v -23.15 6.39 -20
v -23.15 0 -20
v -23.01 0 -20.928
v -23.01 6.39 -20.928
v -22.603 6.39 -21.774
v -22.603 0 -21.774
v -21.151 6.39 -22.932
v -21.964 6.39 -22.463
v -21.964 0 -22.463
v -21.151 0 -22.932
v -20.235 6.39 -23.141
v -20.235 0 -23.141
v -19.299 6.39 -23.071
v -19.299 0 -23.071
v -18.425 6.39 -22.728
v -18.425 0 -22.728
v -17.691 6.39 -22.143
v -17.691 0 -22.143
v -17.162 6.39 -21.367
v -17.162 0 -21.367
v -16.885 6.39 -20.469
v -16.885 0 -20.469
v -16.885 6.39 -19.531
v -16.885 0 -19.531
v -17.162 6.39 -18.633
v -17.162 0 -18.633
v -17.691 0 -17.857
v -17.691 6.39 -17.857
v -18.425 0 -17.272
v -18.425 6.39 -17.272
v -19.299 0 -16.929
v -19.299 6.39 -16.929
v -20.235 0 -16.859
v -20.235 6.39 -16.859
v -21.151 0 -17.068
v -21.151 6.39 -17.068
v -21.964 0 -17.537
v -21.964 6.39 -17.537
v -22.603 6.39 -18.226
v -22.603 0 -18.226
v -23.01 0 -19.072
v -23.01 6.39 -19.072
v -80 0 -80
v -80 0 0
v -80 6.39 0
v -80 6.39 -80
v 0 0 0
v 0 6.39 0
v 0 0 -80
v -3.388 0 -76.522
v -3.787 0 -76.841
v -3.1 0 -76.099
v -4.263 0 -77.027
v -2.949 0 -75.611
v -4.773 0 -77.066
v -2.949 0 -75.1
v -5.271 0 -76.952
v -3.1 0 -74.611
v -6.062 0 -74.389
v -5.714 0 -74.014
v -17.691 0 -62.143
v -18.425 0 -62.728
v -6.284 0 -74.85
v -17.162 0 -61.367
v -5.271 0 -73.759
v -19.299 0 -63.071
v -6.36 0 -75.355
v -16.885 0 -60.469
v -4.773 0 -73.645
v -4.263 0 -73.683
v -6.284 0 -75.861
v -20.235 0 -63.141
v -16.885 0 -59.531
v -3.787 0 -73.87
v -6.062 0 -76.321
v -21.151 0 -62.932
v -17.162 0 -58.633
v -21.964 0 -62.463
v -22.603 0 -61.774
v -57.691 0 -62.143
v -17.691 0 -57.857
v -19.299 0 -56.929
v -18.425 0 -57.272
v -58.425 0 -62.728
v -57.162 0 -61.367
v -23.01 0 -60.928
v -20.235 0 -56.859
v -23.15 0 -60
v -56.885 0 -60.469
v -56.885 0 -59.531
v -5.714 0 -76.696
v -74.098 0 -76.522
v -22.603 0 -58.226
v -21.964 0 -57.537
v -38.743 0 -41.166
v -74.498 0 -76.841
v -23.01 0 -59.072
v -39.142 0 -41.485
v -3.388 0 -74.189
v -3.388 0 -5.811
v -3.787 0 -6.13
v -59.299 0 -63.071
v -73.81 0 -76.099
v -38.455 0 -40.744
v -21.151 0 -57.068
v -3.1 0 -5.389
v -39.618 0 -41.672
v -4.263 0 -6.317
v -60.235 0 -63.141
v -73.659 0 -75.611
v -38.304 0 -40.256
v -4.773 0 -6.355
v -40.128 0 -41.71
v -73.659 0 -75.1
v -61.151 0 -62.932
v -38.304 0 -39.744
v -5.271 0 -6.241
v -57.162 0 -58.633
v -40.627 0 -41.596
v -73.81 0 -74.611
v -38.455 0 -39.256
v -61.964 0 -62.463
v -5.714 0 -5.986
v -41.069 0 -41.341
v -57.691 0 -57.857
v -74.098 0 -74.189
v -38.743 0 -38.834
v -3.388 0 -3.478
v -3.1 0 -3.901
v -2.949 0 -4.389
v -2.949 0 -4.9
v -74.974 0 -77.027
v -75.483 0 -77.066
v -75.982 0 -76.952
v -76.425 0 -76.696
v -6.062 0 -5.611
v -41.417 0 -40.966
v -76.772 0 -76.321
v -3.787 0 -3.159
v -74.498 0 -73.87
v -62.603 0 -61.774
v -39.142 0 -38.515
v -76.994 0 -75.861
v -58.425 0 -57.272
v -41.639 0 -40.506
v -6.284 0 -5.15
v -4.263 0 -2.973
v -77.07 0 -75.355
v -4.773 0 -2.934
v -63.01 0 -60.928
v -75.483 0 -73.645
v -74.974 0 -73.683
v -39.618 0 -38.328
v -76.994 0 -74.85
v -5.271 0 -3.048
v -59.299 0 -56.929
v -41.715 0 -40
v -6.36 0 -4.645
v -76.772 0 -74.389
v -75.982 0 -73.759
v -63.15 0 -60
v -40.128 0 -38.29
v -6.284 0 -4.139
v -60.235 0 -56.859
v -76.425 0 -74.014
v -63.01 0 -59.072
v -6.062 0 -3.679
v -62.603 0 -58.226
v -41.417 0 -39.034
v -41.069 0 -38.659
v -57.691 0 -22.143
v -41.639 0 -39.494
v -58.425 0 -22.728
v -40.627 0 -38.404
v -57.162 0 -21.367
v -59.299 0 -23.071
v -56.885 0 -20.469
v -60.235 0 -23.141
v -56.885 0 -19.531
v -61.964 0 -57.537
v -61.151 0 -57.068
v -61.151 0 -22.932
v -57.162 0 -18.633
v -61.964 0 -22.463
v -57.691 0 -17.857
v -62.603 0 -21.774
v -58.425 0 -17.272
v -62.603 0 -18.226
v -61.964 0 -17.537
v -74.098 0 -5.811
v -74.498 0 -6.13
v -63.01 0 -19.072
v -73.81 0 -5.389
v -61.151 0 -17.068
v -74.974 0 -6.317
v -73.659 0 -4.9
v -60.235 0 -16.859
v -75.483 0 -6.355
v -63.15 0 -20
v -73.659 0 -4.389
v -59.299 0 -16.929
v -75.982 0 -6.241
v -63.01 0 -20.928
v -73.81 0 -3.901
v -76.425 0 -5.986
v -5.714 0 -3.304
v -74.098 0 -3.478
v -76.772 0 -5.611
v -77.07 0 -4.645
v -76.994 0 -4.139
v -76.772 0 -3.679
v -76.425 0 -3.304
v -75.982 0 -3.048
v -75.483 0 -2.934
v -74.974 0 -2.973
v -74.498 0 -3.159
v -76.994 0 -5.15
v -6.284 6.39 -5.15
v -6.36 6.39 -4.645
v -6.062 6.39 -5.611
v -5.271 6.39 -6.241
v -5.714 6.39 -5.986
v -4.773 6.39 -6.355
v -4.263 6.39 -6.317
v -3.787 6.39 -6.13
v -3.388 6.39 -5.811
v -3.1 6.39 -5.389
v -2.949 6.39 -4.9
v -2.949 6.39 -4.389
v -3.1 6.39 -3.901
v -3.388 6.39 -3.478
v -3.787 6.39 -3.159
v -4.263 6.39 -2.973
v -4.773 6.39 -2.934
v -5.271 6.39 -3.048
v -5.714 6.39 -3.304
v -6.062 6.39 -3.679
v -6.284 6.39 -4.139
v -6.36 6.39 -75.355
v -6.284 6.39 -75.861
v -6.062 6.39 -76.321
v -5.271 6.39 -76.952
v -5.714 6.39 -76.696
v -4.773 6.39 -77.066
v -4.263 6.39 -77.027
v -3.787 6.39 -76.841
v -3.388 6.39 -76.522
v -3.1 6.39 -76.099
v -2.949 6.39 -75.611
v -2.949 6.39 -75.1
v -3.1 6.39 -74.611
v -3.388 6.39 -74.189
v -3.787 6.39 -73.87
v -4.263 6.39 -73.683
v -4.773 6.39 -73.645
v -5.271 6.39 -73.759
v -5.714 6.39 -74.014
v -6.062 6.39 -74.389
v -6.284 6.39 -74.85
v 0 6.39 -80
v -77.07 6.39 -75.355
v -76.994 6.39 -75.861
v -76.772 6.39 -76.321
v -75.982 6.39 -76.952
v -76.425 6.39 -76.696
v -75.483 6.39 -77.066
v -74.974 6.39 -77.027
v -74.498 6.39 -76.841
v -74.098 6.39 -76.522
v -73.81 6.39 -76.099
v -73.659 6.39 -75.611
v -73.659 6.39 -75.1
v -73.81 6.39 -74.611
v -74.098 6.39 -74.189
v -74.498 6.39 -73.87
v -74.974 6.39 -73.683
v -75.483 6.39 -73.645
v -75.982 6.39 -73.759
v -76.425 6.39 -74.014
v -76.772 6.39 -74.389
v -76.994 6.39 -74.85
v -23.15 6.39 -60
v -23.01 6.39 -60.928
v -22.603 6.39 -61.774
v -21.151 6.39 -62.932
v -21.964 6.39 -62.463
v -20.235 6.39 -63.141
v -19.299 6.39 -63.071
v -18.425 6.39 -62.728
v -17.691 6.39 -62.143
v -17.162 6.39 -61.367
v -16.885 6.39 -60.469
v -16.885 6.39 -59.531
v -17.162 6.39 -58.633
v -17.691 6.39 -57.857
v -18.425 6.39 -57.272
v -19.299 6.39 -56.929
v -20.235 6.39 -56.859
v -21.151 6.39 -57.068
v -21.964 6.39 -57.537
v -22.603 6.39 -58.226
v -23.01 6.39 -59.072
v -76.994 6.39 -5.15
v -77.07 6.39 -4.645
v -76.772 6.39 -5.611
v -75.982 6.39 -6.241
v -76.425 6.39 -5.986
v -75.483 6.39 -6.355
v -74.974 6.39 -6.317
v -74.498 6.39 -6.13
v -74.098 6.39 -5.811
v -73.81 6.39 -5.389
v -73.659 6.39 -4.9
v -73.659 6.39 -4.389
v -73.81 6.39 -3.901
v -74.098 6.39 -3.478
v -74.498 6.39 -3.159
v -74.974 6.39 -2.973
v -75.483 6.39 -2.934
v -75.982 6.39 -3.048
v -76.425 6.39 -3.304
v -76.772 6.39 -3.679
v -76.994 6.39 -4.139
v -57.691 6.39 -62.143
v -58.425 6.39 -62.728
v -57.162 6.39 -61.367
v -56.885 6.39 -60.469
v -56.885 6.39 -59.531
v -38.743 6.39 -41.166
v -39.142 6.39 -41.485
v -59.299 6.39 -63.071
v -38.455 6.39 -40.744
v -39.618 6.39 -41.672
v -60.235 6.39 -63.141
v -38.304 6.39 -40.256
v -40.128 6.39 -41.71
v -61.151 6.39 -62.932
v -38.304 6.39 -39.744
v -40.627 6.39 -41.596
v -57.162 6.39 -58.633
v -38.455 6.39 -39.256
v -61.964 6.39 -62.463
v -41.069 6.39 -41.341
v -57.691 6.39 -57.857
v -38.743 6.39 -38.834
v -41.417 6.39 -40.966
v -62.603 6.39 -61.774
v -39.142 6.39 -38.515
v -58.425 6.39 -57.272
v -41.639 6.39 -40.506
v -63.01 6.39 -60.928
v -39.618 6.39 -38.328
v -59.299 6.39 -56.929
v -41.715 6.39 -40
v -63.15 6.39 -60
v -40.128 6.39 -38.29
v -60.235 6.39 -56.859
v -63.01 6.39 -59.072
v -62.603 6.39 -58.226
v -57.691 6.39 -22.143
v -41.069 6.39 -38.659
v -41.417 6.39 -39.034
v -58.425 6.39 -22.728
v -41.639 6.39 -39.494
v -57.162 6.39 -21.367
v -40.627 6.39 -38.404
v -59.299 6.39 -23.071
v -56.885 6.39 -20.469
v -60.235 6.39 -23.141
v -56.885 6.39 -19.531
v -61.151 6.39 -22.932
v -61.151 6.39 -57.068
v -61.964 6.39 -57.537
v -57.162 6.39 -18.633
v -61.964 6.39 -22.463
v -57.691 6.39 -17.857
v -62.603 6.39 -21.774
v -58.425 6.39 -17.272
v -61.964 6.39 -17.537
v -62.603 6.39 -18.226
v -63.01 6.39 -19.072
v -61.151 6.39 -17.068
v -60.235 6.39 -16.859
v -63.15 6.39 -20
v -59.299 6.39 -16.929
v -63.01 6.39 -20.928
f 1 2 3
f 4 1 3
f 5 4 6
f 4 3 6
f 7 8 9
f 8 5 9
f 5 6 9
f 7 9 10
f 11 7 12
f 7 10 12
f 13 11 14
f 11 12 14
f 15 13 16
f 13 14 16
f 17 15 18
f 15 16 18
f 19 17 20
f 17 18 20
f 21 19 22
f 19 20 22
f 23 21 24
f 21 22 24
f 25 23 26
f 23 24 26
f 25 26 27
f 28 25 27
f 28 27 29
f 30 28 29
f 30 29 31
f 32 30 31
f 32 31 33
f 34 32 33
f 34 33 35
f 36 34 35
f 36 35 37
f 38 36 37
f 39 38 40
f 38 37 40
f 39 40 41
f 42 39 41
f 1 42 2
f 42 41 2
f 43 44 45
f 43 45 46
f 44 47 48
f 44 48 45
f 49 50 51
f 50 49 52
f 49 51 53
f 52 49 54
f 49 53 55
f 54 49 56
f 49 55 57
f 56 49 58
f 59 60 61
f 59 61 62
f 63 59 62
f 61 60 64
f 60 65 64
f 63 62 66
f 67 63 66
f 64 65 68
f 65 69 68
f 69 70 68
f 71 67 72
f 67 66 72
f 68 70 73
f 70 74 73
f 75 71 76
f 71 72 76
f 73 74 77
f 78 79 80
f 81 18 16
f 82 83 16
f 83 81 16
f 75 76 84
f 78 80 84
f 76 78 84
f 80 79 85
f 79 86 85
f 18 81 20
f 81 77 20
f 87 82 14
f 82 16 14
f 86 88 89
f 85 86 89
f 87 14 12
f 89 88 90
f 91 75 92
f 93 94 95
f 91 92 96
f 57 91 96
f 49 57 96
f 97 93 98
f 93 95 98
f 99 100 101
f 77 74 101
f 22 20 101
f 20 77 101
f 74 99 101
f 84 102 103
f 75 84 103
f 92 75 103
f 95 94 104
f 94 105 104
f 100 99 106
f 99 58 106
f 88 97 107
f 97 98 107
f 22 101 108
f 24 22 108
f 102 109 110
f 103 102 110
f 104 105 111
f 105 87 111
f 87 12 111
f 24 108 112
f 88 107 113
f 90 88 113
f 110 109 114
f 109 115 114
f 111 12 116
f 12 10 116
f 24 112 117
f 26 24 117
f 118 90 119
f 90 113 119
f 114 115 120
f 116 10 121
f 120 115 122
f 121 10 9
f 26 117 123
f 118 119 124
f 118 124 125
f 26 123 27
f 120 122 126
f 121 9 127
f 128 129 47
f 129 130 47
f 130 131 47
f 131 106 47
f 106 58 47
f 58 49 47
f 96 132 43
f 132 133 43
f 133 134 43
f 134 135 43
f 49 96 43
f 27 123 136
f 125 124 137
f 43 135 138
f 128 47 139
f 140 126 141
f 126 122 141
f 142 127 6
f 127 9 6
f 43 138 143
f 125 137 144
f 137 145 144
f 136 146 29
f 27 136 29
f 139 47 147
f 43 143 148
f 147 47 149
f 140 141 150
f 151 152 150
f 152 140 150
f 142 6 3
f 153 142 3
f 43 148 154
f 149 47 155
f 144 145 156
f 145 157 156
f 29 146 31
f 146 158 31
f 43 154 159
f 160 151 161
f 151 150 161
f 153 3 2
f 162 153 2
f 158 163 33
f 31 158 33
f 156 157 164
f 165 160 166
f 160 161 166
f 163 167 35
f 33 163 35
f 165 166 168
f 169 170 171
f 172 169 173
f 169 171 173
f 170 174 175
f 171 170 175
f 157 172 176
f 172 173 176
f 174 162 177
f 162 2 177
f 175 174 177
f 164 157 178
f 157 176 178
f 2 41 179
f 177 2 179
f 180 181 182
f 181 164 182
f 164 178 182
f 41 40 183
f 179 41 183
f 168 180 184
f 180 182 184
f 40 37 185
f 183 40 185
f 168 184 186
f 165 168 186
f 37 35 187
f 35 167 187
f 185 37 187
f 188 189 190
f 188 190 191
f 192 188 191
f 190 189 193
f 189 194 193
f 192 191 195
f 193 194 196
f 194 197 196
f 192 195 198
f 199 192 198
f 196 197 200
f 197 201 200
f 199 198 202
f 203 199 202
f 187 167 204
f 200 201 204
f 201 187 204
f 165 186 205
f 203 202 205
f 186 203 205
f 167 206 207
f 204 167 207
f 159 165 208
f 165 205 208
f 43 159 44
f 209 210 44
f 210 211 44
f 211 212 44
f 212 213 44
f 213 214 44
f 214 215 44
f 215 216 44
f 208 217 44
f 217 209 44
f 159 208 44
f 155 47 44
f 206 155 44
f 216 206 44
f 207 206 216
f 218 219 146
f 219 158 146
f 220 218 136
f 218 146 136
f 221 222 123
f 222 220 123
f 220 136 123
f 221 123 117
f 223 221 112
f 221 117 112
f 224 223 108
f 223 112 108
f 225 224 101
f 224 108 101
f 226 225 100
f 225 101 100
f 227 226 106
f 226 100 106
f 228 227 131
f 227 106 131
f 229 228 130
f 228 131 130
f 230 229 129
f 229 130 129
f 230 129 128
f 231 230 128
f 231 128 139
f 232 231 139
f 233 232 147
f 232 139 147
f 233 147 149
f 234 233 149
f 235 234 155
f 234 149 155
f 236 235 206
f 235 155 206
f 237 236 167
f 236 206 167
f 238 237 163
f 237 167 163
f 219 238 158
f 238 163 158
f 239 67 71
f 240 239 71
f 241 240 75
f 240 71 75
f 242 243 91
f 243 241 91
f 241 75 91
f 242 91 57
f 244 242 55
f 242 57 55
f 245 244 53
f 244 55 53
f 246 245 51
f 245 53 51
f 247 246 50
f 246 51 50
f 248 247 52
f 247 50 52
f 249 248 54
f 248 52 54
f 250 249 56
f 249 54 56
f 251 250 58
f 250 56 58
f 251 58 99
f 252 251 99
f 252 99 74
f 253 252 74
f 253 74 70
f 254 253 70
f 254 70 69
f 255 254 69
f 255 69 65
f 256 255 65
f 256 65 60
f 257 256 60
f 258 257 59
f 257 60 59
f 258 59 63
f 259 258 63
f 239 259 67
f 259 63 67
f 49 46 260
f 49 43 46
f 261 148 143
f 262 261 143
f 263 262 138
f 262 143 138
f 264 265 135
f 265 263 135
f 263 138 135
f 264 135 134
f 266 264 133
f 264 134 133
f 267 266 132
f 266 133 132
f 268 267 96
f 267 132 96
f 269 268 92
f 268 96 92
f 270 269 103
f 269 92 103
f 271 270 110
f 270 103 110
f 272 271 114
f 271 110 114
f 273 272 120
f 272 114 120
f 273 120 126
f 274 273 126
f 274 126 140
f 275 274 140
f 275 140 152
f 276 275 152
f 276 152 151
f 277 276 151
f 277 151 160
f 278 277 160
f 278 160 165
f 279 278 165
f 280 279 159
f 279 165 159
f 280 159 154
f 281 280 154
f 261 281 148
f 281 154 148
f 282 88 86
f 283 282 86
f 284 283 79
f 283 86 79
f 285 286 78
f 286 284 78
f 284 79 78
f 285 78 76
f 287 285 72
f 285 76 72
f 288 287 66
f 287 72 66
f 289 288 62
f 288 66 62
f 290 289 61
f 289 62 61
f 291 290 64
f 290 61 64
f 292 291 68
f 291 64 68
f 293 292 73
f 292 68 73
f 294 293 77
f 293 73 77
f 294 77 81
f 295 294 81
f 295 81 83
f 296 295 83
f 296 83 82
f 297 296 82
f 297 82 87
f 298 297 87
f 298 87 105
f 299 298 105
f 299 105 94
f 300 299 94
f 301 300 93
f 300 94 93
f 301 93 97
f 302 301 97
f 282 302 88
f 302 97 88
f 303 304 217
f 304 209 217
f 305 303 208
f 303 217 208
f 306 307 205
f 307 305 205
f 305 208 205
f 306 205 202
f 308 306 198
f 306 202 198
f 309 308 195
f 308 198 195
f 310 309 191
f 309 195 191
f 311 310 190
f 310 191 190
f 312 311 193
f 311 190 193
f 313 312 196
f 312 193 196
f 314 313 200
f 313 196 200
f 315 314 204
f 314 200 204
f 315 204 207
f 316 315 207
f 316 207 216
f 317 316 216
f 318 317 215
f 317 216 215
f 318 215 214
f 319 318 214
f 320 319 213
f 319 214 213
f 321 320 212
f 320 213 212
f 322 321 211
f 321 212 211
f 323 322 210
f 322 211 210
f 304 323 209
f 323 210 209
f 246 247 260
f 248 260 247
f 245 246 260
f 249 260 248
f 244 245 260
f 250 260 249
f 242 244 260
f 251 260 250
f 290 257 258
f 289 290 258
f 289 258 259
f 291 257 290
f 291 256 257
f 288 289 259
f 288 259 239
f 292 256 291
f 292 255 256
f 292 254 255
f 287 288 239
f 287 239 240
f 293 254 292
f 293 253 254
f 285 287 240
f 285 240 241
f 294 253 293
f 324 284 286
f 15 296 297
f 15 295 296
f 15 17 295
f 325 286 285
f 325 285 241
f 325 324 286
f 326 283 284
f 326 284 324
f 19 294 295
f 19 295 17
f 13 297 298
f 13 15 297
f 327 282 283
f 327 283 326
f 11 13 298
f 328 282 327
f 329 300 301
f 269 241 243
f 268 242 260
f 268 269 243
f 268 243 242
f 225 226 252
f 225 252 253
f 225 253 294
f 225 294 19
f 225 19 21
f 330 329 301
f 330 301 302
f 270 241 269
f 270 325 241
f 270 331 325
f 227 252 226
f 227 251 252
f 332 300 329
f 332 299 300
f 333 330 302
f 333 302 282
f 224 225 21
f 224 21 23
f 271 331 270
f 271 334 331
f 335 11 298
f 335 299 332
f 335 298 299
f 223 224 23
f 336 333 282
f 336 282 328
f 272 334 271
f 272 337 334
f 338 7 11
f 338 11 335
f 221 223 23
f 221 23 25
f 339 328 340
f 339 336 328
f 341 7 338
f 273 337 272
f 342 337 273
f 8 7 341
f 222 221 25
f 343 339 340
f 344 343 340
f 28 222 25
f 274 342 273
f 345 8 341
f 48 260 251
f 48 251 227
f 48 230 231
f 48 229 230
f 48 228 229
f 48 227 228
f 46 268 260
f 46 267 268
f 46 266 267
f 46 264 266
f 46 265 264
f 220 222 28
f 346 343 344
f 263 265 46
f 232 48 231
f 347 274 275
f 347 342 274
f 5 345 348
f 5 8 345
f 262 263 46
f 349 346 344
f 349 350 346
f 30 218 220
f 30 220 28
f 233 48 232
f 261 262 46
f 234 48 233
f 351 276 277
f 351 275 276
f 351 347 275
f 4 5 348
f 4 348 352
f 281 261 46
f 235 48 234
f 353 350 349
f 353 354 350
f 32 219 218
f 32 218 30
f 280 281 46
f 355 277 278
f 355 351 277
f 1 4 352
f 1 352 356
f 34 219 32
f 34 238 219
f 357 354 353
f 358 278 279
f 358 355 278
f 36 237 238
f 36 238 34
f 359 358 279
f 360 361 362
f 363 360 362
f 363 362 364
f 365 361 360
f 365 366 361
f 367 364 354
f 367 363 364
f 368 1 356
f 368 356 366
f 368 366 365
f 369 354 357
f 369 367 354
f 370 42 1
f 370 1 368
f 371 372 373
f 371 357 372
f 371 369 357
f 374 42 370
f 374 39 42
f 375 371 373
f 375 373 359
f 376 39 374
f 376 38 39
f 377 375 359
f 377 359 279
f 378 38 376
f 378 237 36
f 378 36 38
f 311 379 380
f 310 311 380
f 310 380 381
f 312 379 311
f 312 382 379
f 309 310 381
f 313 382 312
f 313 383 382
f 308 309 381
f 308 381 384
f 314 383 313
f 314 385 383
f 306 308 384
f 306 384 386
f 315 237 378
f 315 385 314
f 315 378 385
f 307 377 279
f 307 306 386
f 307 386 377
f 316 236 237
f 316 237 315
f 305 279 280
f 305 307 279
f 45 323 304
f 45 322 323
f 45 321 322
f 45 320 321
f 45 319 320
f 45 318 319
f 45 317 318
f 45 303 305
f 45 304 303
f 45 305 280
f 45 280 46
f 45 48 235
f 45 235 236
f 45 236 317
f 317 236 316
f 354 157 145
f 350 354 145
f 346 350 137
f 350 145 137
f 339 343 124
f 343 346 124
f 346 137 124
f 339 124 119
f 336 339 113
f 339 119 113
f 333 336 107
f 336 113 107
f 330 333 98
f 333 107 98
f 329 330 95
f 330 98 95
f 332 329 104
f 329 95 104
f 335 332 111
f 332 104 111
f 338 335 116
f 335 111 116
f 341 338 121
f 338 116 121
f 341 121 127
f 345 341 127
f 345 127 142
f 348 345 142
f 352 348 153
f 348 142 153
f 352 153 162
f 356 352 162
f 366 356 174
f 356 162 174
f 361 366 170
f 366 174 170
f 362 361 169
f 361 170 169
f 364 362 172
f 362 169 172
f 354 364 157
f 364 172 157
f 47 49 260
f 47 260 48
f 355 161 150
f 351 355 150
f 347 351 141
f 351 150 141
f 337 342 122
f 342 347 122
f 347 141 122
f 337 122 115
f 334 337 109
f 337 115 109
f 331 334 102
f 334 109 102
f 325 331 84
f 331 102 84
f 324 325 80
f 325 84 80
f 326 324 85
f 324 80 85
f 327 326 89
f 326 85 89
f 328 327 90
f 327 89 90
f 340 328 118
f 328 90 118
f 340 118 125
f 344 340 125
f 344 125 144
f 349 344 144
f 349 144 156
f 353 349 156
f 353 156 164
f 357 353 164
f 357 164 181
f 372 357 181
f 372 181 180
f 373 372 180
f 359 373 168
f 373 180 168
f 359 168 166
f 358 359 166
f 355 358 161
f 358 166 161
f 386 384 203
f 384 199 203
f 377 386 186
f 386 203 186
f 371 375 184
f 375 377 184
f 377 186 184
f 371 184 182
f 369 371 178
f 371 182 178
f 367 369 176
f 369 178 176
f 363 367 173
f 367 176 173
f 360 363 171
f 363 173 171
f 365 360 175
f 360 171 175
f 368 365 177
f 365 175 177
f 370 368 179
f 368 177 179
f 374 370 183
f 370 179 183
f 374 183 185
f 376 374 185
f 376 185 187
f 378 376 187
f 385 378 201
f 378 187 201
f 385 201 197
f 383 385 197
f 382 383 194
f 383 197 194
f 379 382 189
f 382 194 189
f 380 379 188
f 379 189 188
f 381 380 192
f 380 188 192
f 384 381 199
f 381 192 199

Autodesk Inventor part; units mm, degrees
ref_plane "YZ Plane" through (0, 0, 0) normal (1, 0, 0) x (0, 1, 0)
ref_plane "XZ Plane" through (0, 0, 0) normal (0, 1, 0) x (-1, 0, 0)
ref_plane "XY Plane" through (0, 0, 0) normal (0, 0, 1) x (1, 0, 0)
sketch "Sketch1" plane through (0, 0, 0) normal (0, 1, 0) x (-1, 0, 0)
  circle A0 centre (20, -20) radius 18.1118 construction
  line L0 (0, 0) -> (80, 0)
  line L1 (80, 0) -> (80, -80)
  line L2 (80, -80) -> (0, -80)
  line L3 (0, -80) -> (0, 0)
  line L4 (40, 0) -> (40, -40) construction
  line L5 (40, -40) -> (80, -40) construction
  line L6 (40, -40) -> (40, -80) construction
  line L7 (40, -40) -> (0, -40) construction
  circle A1 centre (40, -40) radius 1.715
  line L8 (40, -40) -> (0, 0) construction
  circle A2 centre (4.6447, -4.6447) radius 1.715
  circle A3 centre (75.3553, -4.6447) radius 1.715
  circle A4 centre (4.6447, -75.3553) radius 1.715
  circle A5 centre (75.3553, -75.3553) radius 1.715
  circle A6 centre (20, -20) radius 3.15
  circle A7 centre (60, -20) radius 3.15
  circle A8 centre (20, -60) radius 3.15
  circle A9 centre (60, -60) radius 3.15
  point P0 (40, -20)
  point P1 (20, -40)
  dimension "d0" = 36.2235
  dimension "d1" = 80
  dimension "d2" = 80
  dimension "d13" = 3.43
  dimension "d14" = 3.43
  dimension "d15" = 50
  dimension "d16" = 6.3
extrude "Extrusion3" add sketch "Sketch1" along normal blind 6.39
equation "\"d0\" = SiliconeRingDiameter"
equation "\"d1\" = VccumCoverSize"
equation "\"d2\" = VccumCoverSize"
equation "\"d13\" = HoldScrewDiameter"
equation "\"d14\" = HoldScrewDiameter"
equation "\"d16\" = DowlDiameter"
equation "\"d17\" = WoodThickness"
equation "\"BearingHolderHeight\" = 13.1"
equation "\"SiliconeRingDiameter\" = 0.75 * CouplingDiameter + 1.5 * BearingHolderHeight"
equation "\"DowlDiameter\" = 6.3"
equation "\"HoldScrewDiameter\" = 3.43"
equation "\"VccumCoverSize\" = 80"
equation "\"WoodThickness\" = 6.39"
equation "\"CouplingDiameter\" = 22.098"
properties part number "MotorSiliconeMold_1" material "MDF Medium Density Fiberboard"
